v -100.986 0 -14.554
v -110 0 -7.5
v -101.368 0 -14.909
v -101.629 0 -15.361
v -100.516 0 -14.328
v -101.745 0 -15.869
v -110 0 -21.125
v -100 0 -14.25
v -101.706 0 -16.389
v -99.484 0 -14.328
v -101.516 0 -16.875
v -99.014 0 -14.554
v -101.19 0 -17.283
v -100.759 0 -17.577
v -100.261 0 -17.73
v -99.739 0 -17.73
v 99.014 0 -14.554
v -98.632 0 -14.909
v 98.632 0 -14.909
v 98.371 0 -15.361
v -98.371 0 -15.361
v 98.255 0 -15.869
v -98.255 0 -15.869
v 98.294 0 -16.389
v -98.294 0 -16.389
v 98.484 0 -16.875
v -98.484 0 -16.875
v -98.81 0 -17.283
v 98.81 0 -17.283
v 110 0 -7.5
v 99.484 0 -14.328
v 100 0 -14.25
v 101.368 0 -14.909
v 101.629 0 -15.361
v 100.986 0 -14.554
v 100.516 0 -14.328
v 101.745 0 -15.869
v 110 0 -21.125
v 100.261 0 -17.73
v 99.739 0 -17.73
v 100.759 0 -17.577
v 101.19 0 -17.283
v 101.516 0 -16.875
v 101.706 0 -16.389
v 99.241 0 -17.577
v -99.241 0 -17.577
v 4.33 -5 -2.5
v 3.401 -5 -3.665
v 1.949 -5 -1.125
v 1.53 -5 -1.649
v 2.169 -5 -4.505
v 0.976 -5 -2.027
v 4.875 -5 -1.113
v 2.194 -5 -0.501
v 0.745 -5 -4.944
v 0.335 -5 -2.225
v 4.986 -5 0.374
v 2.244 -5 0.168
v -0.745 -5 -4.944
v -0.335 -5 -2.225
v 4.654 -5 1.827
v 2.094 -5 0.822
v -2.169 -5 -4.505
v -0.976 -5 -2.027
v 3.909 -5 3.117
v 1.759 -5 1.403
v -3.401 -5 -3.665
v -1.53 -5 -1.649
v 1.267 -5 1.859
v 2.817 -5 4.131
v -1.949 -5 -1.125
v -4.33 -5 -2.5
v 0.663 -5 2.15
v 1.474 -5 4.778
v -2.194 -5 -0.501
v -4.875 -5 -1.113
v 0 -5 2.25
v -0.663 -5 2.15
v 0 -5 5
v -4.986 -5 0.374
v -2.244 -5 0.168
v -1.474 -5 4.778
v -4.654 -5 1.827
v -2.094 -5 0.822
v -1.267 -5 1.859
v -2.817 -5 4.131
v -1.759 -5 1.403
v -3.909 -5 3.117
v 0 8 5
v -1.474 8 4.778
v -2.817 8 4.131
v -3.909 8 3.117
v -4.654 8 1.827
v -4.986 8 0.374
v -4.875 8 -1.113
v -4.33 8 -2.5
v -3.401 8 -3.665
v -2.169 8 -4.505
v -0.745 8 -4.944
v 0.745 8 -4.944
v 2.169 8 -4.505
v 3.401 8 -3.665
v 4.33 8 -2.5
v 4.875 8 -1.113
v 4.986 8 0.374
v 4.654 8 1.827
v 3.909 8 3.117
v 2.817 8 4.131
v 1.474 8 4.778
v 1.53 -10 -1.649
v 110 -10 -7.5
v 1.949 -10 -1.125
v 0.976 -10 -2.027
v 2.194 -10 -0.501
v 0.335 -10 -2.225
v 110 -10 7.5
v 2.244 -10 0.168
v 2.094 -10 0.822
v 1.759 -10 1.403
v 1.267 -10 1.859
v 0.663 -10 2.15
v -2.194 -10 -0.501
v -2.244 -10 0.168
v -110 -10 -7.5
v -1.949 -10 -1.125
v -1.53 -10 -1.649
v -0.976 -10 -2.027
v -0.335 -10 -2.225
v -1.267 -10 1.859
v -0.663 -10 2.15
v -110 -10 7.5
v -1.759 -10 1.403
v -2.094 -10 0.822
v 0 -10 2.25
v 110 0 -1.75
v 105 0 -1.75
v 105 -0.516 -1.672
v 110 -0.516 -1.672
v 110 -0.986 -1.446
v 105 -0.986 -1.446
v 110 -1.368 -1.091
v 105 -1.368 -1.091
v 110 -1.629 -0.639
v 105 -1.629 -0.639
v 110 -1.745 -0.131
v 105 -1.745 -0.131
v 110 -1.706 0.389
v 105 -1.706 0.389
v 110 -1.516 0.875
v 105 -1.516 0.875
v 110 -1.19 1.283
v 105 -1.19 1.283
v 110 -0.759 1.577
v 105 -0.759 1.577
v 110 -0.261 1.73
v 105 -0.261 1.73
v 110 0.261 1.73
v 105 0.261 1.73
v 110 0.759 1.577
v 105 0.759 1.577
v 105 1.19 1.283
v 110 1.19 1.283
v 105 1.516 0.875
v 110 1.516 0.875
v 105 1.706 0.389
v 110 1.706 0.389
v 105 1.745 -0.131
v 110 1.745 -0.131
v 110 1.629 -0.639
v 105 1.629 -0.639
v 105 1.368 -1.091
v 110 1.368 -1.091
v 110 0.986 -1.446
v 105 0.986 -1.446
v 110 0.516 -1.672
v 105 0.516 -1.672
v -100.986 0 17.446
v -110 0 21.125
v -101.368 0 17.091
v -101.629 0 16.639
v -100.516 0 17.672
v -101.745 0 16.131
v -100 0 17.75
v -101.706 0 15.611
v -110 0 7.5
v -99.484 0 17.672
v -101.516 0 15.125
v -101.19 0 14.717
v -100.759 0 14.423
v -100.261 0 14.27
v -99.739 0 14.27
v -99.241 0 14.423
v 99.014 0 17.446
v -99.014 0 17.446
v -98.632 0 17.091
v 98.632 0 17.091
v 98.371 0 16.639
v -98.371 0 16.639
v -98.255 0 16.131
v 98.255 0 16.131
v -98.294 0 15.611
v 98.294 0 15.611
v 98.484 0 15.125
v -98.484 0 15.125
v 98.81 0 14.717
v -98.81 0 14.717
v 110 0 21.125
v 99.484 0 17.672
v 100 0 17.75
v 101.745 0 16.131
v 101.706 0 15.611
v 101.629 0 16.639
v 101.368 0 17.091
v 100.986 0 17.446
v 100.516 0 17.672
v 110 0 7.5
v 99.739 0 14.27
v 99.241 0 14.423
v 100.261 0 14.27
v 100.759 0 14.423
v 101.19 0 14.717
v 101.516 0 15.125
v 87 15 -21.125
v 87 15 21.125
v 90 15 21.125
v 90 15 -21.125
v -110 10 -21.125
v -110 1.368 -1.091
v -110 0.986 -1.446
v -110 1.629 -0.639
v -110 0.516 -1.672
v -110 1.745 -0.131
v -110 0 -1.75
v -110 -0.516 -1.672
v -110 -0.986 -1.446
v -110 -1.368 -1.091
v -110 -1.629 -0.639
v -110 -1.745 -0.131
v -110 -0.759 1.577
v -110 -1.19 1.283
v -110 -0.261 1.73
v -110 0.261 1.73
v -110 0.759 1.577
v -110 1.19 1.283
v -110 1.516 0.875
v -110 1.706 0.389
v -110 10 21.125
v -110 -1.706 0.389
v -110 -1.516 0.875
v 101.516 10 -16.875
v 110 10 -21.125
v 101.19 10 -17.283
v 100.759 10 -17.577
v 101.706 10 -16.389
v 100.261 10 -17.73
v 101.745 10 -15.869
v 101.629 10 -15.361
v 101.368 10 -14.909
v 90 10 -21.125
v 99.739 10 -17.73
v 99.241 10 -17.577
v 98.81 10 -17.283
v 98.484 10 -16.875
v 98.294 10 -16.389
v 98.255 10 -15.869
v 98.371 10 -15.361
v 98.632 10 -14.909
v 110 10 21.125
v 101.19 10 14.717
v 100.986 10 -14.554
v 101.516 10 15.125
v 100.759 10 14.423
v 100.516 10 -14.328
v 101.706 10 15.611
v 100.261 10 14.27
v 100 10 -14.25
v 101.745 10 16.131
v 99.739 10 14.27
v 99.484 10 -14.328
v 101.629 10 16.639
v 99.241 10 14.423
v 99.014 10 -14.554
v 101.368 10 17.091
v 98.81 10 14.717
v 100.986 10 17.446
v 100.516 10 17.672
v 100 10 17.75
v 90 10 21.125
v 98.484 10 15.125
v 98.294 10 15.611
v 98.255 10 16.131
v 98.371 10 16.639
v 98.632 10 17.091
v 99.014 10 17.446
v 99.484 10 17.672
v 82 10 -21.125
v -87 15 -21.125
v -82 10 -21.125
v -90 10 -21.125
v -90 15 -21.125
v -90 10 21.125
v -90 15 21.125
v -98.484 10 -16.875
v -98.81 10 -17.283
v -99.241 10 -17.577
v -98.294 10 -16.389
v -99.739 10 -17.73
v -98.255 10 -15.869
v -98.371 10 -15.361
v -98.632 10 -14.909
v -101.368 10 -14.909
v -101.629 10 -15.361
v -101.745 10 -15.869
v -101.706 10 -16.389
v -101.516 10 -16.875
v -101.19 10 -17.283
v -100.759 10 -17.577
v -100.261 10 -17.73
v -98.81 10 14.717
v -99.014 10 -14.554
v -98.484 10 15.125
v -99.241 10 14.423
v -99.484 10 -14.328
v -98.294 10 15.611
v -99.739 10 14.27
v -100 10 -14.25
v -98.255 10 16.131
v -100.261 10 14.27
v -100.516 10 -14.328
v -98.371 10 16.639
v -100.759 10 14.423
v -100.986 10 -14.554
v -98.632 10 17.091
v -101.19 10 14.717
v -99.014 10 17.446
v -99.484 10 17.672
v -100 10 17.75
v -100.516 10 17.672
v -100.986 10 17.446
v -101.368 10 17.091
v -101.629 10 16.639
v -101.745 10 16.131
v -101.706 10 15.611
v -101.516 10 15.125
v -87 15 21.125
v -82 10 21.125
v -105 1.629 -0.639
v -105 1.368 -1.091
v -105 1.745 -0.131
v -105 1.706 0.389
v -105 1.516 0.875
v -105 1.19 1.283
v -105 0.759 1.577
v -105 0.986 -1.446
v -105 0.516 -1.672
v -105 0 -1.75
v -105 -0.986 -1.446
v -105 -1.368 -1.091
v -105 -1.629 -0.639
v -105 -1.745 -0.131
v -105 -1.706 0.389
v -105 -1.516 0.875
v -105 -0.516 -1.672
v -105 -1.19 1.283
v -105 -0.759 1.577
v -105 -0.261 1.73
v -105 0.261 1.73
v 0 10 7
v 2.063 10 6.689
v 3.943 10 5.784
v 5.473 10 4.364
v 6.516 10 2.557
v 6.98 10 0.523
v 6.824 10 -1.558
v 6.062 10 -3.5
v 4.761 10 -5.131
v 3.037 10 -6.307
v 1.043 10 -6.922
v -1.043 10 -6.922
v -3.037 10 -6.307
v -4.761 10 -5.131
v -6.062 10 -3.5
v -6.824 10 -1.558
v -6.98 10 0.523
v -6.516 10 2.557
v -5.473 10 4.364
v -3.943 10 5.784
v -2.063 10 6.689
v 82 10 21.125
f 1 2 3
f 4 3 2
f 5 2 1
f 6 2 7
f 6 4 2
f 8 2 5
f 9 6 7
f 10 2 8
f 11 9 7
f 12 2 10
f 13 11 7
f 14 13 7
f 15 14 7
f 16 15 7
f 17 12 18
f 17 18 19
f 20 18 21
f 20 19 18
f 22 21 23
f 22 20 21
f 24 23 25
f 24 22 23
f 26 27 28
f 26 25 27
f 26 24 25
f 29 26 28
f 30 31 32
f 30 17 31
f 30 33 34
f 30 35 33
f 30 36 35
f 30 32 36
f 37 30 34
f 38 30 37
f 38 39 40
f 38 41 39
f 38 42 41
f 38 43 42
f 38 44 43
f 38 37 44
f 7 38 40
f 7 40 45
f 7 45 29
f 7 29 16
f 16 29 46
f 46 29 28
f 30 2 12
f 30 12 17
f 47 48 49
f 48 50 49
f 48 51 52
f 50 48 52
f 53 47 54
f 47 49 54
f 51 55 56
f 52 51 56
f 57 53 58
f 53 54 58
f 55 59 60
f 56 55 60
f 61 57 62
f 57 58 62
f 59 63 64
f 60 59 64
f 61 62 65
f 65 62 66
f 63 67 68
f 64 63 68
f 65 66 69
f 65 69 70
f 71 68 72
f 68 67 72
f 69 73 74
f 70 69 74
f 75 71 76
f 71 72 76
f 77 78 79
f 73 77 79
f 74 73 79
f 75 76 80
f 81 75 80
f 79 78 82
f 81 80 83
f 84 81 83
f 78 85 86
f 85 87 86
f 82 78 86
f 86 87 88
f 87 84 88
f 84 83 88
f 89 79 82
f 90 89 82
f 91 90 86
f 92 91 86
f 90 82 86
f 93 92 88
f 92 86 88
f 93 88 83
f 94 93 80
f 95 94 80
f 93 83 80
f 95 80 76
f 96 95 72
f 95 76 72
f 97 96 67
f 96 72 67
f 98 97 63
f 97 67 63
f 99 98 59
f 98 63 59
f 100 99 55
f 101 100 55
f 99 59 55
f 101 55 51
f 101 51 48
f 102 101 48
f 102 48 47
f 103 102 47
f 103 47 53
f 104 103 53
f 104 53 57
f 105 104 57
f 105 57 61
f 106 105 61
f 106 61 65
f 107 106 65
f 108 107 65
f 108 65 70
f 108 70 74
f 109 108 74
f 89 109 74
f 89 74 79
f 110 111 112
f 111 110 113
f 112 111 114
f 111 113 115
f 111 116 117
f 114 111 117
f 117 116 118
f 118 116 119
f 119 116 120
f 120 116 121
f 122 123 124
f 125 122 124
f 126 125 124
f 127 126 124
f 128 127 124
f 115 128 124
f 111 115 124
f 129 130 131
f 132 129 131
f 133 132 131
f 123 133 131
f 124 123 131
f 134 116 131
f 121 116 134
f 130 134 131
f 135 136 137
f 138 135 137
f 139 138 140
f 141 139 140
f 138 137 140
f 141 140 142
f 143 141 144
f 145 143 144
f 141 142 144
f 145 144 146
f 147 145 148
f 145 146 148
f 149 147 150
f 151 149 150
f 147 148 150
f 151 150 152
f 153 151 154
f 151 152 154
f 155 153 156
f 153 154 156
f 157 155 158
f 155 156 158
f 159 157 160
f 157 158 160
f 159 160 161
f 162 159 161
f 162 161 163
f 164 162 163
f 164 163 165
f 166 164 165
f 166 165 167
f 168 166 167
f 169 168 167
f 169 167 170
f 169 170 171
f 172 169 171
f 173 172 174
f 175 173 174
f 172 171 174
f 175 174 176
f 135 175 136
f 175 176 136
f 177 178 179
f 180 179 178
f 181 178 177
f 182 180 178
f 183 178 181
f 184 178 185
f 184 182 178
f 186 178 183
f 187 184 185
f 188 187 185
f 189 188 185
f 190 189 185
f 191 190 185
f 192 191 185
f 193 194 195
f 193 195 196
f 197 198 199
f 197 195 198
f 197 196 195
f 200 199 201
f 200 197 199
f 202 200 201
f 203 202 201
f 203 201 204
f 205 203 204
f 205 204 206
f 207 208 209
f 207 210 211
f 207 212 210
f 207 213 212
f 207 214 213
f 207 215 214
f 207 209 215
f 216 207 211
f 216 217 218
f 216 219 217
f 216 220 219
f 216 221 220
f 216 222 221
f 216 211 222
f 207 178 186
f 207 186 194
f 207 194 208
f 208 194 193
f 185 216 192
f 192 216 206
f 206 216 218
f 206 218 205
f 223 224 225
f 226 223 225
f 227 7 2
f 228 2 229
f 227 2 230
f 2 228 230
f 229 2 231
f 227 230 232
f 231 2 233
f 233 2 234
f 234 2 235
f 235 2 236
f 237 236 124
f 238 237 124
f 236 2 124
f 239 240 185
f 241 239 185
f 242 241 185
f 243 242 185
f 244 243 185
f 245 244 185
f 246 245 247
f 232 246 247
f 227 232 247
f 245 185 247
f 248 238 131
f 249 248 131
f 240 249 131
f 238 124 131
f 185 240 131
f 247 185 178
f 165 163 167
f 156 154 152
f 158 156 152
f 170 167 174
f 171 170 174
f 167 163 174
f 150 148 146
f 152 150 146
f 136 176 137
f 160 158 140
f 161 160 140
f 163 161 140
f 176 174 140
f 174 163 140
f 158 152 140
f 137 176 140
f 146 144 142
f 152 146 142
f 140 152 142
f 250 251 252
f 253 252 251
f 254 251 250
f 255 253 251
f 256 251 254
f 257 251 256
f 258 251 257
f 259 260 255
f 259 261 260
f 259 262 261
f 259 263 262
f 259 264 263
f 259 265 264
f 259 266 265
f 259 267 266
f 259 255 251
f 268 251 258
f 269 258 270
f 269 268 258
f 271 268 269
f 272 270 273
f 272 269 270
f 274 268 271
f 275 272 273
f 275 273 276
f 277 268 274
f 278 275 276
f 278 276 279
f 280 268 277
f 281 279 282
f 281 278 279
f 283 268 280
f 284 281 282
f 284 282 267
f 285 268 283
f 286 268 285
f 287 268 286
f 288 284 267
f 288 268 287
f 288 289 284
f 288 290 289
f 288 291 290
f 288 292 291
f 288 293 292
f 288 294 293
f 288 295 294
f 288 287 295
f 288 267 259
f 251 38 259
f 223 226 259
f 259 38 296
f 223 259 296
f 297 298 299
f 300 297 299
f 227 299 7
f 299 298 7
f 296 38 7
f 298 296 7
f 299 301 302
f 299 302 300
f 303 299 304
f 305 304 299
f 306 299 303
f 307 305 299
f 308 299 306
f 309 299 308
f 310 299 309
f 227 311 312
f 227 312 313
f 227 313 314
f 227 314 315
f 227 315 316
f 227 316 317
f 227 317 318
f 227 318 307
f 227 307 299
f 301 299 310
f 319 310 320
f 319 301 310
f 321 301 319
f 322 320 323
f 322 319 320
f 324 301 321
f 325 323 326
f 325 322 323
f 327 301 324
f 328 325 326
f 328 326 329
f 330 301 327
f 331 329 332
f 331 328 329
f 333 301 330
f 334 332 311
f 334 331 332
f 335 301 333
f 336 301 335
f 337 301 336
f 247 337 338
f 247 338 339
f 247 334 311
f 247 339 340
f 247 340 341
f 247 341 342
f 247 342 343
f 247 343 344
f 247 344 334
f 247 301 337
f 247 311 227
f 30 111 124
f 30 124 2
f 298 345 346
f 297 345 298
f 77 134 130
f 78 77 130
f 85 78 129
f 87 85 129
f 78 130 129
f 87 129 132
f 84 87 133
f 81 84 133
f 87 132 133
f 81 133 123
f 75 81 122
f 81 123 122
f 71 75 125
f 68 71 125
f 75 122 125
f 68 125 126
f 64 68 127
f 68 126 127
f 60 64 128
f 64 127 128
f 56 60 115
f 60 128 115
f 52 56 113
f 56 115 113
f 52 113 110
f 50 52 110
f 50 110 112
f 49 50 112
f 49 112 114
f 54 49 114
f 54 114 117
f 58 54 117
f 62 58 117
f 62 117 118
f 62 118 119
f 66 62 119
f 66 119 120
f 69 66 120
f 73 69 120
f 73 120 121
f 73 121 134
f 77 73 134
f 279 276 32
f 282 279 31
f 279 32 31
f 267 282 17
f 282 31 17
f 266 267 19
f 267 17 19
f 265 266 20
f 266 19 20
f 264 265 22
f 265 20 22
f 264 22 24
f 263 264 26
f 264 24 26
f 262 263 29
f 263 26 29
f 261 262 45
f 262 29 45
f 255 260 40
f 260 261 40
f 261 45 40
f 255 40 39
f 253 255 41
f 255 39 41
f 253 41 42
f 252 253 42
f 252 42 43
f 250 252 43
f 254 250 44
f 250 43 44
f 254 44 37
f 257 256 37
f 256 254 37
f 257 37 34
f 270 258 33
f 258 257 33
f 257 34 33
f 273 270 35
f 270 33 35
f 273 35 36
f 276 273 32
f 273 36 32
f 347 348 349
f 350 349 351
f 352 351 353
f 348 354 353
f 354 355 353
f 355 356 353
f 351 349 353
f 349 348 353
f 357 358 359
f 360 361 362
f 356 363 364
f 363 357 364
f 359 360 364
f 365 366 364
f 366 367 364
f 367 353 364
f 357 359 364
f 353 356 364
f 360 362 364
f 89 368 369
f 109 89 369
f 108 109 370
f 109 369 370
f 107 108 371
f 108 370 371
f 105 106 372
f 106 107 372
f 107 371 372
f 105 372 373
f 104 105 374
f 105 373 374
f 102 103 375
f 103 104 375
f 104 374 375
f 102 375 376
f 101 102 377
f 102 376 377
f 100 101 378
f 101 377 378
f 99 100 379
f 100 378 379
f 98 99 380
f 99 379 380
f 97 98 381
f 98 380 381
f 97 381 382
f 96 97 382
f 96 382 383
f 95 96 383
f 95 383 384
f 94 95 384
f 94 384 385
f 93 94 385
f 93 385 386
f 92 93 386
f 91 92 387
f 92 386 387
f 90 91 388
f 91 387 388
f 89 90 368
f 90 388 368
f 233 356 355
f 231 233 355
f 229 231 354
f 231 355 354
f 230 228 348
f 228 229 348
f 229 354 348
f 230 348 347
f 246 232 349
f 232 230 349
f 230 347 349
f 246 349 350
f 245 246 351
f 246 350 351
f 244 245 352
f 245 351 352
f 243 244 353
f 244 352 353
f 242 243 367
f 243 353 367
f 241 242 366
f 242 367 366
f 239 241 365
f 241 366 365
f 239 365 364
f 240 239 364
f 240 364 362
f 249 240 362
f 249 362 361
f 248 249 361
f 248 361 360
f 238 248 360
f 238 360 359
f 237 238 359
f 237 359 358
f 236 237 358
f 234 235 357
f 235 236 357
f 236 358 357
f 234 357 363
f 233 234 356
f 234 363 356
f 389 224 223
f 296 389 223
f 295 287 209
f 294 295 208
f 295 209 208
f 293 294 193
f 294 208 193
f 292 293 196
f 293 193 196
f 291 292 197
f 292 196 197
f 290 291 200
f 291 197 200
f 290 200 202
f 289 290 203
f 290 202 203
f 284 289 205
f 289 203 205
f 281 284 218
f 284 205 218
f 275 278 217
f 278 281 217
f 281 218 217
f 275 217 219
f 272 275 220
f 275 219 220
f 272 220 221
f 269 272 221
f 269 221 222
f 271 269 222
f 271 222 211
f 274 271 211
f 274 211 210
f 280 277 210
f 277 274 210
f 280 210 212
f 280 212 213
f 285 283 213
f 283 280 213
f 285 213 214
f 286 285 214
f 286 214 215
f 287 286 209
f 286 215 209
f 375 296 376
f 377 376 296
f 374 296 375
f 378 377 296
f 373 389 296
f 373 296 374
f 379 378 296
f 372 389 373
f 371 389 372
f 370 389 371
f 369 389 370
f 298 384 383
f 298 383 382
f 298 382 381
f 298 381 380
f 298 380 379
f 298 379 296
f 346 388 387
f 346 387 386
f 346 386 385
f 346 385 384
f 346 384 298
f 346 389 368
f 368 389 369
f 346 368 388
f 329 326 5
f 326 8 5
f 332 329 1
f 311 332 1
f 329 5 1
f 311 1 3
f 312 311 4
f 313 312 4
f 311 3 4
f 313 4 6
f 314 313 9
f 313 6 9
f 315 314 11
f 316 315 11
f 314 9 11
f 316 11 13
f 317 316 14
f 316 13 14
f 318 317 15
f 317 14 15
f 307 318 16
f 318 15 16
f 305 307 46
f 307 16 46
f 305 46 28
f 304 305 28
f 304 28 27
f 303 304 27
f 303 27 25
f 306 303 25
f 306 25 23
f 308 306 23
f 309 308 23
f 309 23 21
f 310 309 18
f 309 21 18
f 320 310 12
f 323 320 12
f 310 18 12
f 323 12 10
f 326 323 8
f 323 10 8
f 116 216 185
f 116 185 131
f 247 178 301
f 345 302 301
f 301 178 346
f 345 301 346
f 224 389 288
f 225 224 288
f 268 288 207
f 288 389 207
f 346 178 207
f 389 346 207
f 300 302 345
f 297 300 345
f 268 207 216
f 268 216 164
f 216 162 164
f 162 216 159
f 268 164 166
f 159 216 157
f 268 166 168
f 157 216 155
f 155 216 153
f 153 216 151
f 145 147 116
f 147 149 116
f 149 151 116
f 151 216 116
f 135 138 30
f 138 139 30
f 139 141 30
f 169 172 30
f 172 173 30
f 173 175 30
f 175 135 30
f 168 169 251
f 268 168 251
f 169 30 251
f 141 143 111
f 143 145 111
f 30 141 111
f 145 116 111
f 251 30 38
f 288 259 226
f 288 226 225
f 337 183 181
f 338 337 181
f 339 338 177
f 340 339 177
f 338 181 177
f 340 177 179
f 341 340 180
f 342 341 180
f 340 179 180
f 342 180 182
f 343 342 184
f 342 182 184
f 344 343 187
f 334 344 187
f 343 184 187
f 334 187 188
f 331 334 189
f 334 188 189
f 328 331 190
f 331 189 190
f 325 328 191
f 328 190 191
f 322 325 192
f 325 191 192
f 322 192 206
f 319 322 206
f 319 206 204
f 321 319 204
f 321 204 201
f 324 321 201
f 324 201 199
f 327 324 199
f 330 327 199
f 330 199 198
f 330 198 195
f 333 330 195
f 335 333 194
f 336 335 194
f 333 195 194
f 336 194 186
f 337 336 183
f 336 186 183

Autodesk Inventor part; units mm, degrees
ref_plane "YZ Plane" through (0, 0, 0) normal (1, 0, 0) x (0, 1, 0)
ref_plane "XZ Plane" through (0, 0, 0) normal (0, 1, 0) x (-1, 0, 0)
ref_plane "XY Plane" through (0, 0, 0) normal (0, 0, 1) x (1, 0, 0)
sketch "Sketch1" plane through (0, 0, 0) normal (0, 1, 0) x (-1, 0, 0)
  line L0 (110, 21.125) -> (-110, 21.125)
  line L1 (-110, 21.125) -> (-110, -21.125)
  line L2 (-110, -21.125) -> (110, -21.125)
  line L3 (110, -21.125) -> (110, 21.125)
  line L4 (110, 21.125) -> (-110, -21.125) construction
  line L5 (-110, 21.125) -> (110, -21.125) construction
  point P0 (0, 0)
  dimension "d0" = 42.25
  dimension "d1" = 220
extrude "Extrusion1" add sketch "Sketch1" along normal mid plane 20
sketch "Sketch2" plane through (0, 10, 0) normal (0, 1, 0) x (1, 0, 0)
  line L0 (110, 21.125) -> (-110, 21.125) projected
  line L1 (-110, -21.125) -> (110, -21.125) projected
  line L2 (-110, 21.125) -> (-110, -21.125) projected
  point P0 (0, 0)
  point P1 (-100, -16)
  point P2 (-100, 16)
  point P3 (-110, 0)
  dimension "d4" = 10
  dimension "d5" = 32
  dimension "d6" = 16
hole "Hole1" at (-100, 10, 16) at (-100, 10, -16) direction (0, -1, 0) diameter 3.5 end through all
mirror "Mirror1" about plane through (0, 0, 0) normal (1, 0, 0) of "Hole1"
sketch "Sketch4" plane through (0, 10, 0) normal (0, 1, 0) x (1, 0, 0)
  point P0 (0, 0)
  point P1 (0, 0)
hole "Hole2" at (0, 10, 0) direction (0, -1, 0) diameter 4.5 end through all counterbore diameter 10 counterbore depth 15
chamfer "Chamfer1" distance 2 angle 45 1 edges at (0, 10, -5)
sketch "Sketch6" plane through (110, -10, -21.125) normal (1, 0, 0) x (0, 0, -1)
  line L0 (-42.25, 20) -> (0, 20) projected
  line L1 (-28.625, 0) -> (-13.625, 0)
  line L2 (-13.625, 0) -> (-13.625, 20)
  line L3 (-13.625, 20) -> (-28.625, 20)
  line L4 (-28.625, 20) -> (-28.625, 0)
  line L5 (-28.625, 0) -> (-13.625, 20) construction
  line L6 (-13.625, 0) -> (-28.625, 20) construction
  line L7 (-42.25, 20) -> (-42.25, 0) projected
  line L8 (-42.25, 10) -> (0, 10)
  line L9 (0, 0) -> (0, 20) projected
  line L10 (0, 0) -> (0, 20) projected
  line L11 (-42.25, 20) -> (0, 20) projected
  line L12 (-42.25, 20) -> (-42.25, 0) projected
  line L13 (0, 0) -> (-42.25, 0) projected
  point P0 (-21.125, 10)
  point P1 (-13.625, 0)
  point P2 (-13.625, 10)
  point P3 (-28.625, 0)
  point P4 (-28.625, 10)
  dimension "d31" = 15
extrude "Extrusion4" cut sketch "Sketch6" against normal through all contours L8 L4 L13 L7 | L8 L9 L13 L2
sketch "Sketch7" plane through (110, 10, 21.125) normal (1, 0, 0) x (0, 0, -1)
  line L0 (0, -10) -> (13.625, -10) projected
  line L1 (28.625, -10) -> (42.25, -10) projected
  line L2 (0, 0) -> (0, -10) projected
  line L3 (42.25, -10) -> (42.25, 0) projected
  point P0 (21.125, -10)
  point P1 (6.8125, -5)
  point P2 (35.4375, -5)
  point P3 (6.8125, -10)
  point P4 (35.4375, -10)
  point P5 (0, -5)
  point P6 (42.25, -5)
  point P7 (21.125, -10)
hole "Hole3" at (110, 0, 0) direction (-1, 0, 0) diameter 3.5 depth 5
sketch "Sketch9" plane through (0, 10, 0) normal (0, 1, 0) x (1, 0, 0)
  line L0 (-110, -21.125) -> (110, -21.125) projected
  line L1 (90, -21.125) -> (87, -21.125)
  line L2 (87, -21.125) -> (87, 21.125)
  line L3 (87, 21.125) -> (90, 21.125)
  line L4 (90, 21.125) -> (90, -21.125)
  line L5 (110, -21.125) -> (110, 21.125) projected
  point P0 (0, 0)
  point P1 (87, -21.125)
  dimension "d41" = 20
  dimension "d42" = 3
extrude "Extrusion5" add sketch "Sketch9" along normal blind 5
chamfer "Chamfer2" distance 5 angle 45 1 edges at (87, 10, 0)
mirror "Mirror2" about plane through (0, 0, 0) normal (1, 0, 0) of "Hole3", "Extrusion5", "Chamfer2"
equation "\"d6\" = 0.5 * d5"
properties part number "caster_holder_3DPrint"
